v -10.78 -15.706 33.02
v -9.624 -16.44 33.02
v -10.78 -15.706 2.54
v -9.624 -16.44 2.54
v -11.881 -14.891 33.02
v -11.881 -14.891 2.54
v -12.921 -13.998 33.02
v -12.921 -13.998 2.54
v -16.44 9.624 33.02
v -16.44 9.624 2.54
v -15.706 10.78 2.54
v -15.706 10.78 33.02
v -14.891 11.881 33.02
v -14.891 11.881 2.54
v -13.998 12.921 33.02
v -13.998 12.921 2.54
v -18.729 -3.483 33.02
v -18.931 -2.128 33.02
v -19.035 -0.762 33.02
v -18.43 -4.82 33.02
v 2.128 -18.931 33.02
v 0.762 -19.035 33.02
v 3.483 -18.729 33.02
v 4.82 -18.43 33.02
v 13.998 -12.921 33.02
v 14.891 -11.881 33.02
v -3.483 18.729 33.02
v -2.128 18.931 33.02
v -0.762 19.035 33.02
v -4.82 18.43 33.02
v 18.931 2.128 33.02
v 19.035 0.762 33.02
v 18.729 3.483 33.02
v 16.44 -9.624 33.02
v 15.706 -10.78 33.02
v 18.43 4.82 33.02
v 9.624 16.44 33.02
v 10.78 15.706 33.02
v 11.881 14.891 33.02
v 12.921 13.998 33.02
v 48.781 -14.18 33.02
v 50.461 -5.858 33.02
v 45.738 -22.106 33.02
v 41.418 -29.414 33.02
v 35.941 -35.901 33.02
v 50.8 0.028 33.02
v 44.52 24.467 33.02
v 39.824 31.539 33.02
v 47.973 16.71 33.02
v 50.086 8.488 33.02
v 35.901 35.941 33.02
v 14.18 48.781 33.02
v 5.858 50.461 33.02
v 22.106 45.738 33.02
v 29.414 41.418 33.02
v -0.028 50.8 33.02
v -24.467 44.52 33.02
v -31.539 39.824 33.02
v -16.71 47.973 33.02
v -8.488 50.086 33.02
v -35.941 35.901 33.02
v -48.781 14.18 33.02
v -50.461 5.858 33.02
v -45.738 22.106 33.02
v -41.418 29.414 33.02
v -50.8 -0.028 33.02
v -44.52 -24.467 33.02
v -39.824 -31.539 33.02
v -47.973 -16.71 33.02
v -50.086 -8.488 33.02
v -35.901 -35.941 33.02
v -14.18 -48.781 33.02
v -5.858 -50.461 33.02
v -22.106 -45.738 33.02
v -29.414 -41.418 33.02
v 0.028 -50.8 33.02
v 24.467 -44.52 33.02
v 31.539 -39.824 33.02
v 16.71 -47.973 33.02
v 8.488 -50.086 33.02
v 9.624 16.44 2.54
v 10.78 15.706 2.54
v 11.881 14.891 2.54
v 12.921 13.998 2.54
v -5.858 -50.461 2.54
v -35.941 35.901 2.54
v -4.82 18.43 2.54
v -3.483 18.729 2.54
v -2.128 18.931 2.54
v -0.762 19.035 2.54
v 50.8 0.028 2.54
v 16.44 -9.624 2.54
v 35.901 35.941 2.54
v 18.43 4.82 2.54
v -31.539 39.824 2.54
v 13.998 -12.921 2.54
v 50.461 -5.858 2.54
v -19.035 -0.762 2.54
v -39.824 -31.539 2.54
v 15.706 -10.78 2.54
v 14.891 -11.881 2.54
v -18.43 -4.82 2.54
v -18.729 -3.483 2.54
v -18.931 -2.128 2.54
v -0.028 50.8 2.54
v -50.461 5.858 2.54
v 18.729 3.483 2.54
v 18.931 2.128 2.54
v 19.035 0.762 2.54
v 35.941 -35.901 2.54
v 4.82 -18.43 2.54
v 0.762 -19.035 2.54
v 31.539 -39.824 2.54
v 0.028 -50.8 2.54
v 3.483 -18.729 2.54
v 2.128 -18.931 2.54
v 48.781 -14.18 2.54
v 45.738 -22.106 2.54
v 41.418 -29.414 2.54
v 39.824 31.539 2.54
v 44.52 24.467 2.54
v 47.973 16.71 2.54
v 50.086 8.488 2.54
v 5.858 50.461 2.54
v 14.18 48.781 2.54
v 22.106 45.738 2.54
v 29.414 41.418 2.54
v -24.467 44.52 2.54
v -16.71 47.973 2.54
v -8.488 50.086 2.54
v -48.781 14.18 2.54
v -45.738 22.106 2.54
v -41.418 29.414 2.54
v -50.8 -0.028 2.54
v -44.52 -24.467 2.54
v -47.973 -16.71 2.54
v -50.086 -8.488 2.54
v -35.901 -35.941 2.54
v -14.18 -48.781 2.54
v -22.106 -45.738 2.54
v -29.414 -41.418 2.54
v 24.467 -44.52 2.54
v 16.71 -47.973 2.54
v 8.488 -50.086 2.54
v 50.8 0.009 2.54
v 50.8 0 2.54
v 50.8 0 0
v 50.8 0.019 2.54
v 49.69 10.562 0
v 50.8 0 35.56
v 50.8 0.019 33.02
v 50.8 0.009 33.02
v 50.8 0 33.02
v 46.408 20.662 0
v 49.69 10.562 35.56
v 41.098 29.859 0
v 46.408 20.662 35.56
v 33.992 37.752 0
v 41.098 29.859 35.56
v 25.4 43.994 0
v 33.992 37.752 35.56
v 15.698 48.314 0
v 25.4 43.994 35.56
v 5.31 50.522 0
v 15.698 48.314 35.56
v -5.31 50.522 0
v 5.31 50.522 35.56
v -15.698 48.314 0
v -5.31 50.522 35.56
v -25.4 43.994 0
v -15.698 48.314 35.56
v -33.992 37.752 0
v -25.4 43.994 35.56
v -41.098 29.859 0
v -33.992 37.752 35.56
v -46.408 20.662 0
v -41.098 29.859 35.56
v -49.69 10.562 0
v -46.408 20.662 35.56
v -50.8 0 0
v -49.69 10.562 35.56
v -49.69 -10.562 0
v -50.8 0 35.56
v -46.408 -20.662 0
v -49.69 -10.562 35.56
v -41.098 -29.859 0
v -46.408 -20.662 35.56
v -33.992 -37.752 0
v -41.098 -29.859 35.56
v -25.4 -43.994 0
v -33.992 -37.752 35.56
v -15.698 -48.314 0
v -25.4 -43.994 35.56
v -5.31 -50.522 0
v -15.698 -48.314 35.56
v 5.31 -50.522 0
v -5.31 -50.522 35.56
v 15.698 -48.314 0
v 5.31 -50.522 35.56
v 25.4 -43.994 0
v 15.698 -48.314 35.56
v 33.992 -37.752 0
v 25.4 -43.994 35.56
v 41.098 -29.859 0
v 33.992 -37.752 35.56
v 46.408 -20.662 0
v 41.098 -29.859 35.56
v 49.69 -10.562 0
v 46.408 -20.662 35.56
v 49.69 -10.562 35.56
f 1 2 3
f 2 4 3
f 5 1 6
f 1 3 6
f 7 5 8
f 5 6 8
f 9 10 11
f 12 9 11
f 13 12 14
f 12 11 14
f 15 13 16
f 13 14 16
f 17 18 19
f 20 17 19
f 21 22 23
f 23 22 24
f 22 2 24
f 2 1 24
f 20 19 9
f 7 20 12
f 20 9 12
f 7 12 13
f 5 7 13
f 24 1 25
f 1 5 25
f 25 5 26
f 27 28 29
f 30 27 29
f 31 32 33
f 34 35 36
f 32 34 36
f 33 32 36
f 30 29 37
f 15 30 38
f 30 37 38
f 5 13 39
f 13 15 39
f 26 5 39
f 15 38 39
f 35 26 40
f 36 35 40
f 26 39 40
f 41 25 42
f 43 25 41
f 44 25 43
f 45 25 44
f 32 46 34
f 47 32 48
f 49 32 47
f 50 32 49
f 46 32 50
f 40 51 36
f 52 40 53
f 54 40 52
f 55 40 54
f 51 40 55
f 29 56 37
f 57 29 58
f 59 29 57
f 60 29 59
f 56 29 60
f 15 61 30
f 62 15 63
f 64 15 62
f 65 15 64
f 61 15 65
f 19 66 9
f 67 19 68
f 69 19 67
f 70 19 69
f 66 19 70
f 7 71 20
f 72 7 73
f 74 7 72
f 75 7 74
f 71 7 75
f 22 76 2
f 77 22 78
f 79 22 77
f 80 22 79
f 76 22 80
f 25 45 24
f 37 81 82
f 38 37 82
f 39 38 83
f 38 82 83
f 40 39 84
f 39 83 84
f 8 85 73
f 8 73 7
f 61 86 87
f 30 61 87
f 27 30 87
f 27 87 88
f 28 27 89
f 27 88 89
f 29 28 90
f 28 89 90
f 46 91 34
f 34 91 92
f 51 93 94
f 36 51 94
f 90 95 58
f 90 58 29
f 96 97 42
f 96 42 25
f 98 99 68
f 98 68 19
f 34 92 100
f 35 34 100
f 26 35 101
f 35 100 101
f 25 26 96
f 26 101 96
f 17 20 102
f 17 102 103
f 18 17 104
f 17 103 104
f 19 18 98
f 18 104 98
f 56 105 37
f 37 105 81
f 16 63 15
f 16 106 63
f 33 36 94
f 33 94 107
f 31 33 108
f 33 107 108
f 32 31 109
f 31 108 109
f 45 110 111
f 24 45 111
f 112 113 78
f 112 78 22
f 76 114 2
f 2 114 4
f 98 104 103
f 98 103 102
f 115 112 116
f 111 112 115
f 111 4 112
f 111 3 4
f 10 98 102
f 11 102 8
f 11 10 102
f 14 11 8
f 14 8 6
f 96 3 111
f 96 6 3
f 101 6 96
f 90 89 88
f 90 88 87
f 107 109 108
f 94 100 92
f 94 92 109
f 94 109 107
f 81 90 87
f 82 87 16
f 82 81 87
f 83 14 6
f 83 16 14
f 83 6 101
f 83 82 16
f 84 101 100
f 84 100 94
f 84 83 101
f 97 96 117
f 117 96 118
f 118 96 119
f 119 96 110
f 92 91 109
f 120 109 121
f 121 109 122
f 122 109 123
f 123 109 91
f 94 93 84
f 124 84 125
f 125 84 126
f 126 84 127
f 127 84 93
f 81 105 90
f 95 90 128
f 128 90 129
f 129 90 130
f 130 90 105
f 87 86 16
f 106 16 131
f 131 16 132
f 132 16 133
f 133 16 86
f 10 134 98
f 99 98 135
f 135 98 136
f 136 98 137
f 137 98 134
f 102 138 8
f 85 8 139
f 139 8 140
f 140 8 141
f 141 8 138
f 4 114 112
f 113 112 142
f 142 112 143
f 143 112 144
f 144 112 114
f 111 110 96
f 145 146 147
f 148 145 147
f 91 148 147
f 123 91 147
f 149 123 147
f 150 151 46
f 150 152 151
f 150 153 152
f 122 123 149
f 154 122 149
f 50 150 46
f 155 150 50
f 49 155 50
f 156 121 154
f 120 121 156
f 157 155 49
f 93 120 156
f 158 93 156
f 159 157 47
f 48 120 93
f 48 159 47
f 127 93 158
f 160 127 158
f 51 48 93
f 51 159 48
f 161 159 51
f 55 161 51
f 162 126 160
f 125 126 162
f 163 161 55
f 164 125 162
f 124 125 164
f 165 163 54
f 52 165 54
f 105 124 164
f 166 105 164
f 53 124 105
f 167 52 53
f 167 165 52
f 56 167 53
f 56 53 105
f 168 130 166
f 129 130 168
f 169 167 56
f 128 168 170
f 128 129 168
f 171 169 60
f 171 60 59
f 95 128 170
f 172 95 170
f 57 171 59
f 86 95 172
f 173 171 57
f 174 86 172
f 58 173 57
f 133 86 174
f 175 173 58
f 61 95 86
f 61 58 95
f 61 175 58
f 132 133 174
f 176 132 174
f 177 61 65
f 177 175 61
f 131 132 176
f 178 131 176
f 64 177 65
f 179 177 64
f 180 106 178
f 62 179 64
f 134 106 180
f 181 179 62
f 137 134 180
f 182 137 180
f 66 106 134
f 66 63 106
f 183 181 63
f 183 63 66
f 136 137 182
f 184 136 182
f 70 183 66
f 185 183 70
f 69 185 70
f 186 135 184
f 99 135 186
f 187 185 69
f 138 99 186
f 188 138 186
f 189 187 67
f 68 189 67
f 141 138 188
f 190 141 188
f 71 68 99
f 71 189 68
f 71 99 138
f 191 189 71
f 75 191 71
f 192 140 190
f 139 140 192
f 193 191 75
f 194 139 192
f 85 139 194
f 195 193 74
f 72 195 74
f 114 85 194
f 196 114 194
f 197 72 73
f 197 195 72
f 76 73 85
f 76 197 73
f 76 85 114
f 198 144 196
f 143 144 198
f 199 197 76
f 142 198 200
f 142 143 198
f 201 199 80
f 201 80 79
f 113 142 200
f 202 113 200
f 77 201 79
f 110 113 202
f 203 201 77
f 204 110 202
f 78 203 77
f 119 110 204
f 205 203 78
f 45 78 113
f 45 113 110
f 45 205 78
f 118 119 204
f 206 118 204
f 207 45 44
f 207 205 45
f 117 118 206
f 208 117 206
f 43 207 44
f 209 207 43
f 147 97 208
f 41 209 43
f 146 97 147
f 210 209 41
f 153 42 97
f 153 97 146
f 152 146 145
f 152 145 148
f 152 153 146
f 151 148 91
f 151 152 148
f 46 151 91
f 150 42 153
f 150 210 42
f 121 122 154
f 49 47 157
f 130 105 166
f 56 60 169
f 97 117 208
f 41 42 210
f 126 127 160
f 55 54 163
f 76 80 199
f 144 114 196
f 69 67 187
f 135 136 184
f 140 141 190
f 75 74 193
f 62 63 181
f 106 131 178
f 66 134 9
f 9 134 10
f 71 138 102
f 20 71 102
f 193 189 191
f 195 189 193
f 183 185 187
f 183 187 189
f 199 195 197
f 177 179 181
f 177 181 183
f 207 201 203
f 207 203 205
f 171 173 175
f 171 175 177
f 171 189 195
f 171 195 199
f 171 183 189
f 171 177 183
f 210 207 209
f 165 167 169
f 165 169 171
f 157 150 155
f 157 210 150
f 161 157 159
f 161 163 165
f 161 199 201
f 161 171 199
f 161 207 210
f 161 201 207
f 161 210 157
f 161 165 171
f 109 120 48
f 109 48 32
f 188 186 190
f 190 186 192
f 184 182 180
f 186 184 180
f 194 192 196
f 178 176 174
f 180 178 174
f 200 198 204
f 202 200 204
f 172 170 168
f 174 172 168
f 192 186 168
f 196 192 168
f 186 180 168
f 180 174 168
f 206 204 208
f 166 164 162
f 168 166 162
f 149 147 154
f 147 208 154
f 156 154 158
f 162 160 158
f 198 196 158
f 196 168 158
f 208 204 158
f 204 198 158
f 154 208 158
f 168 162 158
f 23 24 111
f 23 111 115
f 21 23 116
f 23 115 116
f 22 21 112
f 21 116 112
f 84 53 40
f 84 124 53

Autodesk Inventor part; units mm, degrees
ref_plane "YZ Plane" through (0, 0, 0) normal (1, 0, 0) x (0, 1, 0)
ref_plane "XZ Plane" through (0, 0, 0) normal (0, 1, 0) x (-1, 0, 0)
sketch "Sketch1" plane through (0, 0, 0) normal (0, 0, 1) x (1, 0, 0)
  circle A0 centre (0, 0) radius 50.8
  dimension "d0" = 101.6
extrude "Extrusion1" add sketch "Sketch1" along normal blind 2.54
sketch "Sketch2" plane through (0, 0, 2.54) normal (0, 0, 1) x (1, 0, 0)
  circle A0 centre (0, 0) radius 50.8 projected
  arc A1 (5.858, 50.4611) -> (-0.0279, 50.8) centre (0, 0) ccw
  arc A2 (12.9209, 13.9983) -> (9.6237, 16.4404) centre (0, 0) ccw
  line L0 (-0.0279, 50.8) -> (9.6237, 16.4404)
  line L1 (5.858, 50.4611) -> (12.9209, 13.9983)
  arc A3 (39.8236, 31.5392) -> (35.9013, 35.9408) centre (0, 0) ccw
  arc A4 (19.0348, 0.7618) -> (18.4301, 4.8202) centre (0, 0) ccw
  line L2 (35.9013, 35.9408) -> (18.4301, 4.8202)
  line L3 (39.8236, 31.5392) -> (19.0348, 0.7618)
  arc A5 (50.4611, -5.858) -> (50.8, 0.0279) centre (0, 0) ccw
  arc A6 (13.9983, -12.9209) -> (16.4404, -9.6237) centre (0, 0) ccw
  line L4 (50.8, 0.0279) -> (16.4404, -9.6237)
  line L5 (50.4611, -5.858) -> (13.9983, -12.9209)
  arc A7 (31.5392, -39.8236) -> (35.9408, -35.9013) centre (0, 0) ccw
  arc A8 (0.7618, -19.0348) -> (4.8202, -18.4301) centre (0, 0) ccw
  line L6 (35.9408, -35.9013) -> (4.8202, -18.4301)
  line L7 (31.5392, -39.8236) -> (0.7618, -19.0348)
  arc A9 (-5.858, -50.4611) -> (0.0279, -50.8) centre (0, 0) ccw
  arc A10 (-12.9209, -13.9983) -> (-9.6237, -16.4404) centre (0, 0) ccw
  line L8 (0.0279, -50.8) -> (-9.6237, -16.4404)
  line L9 (-5.858, -50.4611) -> (-12.9209, -13.9983)
  arc A11 (-39.8236, -31.5392) -> (-35.9013, -35.9408) centre (0, 0) ccw
  arc A12 (-19.0348, -0.7618) -> (-18.4301, -4.8202) centre (0, 0) ccw
  line L10 (-35.9013, -35.9408) -> (-18.4301, -4.8202)
  line L11 (-39.8236, -31.5392) -> (-19.0348, -0.7618)
  arc A13 (-50.4611, 5.858) -> (-50.8, -0.0279) centre (0, 0) ccw
  arc A14 (-13.9983, 12.9209) -> (-16.4404, 9.6237) centre (0, 0) ccw
  line L12 (-50.8, -0.0279) -> (-16.4404, 9.6237)
  line L13 (-50.4611, 5.858) -> (-13.9983, 12.9209)
  arc A15 (-31.5392, 39.8236) -> (-35.9408, 35.9013) centre (0, 0) ccw
  arc A16 (-0.7618, 19.0348) -> (-4.8202, 18.4301) centre (0, 0) ccw
  line L14 (-35.9408, 35.9013) -> (-4.8202, 18.4301)
  line L15 (-31.5392, 39.8236) -> (-0.7618, 19.0348)
  dimension "d7" = 360
extrude "Extrusion2" add sketch "Sketch2" along normal blind 30.48 contours A0 L5 A6 L4 | L3 A4 L2 A0 | A0 L7 A8 L6 | L1 A2 L0 A0 | A0 L9 A10 L8 | L15 A16 L14 A0 | A0 L11 A12 L10 | L13 A14 L12 A0
ref_plane "Work Plane1" through (0, 0, 35.56) normal (0, 0, 1) x (1, 0, 0)
sketch "Sketch3" plane through (0, 0, 35.56) normal (0, 0, 1) x (1, 0, 0)
  circle A0 centre (0, 0) radius 50.8
  dimension "d12" = 101.6
extrude "Extrusion3" add sketch "Sketch3" against normal blind 2.54
properties part number "Box fan"
